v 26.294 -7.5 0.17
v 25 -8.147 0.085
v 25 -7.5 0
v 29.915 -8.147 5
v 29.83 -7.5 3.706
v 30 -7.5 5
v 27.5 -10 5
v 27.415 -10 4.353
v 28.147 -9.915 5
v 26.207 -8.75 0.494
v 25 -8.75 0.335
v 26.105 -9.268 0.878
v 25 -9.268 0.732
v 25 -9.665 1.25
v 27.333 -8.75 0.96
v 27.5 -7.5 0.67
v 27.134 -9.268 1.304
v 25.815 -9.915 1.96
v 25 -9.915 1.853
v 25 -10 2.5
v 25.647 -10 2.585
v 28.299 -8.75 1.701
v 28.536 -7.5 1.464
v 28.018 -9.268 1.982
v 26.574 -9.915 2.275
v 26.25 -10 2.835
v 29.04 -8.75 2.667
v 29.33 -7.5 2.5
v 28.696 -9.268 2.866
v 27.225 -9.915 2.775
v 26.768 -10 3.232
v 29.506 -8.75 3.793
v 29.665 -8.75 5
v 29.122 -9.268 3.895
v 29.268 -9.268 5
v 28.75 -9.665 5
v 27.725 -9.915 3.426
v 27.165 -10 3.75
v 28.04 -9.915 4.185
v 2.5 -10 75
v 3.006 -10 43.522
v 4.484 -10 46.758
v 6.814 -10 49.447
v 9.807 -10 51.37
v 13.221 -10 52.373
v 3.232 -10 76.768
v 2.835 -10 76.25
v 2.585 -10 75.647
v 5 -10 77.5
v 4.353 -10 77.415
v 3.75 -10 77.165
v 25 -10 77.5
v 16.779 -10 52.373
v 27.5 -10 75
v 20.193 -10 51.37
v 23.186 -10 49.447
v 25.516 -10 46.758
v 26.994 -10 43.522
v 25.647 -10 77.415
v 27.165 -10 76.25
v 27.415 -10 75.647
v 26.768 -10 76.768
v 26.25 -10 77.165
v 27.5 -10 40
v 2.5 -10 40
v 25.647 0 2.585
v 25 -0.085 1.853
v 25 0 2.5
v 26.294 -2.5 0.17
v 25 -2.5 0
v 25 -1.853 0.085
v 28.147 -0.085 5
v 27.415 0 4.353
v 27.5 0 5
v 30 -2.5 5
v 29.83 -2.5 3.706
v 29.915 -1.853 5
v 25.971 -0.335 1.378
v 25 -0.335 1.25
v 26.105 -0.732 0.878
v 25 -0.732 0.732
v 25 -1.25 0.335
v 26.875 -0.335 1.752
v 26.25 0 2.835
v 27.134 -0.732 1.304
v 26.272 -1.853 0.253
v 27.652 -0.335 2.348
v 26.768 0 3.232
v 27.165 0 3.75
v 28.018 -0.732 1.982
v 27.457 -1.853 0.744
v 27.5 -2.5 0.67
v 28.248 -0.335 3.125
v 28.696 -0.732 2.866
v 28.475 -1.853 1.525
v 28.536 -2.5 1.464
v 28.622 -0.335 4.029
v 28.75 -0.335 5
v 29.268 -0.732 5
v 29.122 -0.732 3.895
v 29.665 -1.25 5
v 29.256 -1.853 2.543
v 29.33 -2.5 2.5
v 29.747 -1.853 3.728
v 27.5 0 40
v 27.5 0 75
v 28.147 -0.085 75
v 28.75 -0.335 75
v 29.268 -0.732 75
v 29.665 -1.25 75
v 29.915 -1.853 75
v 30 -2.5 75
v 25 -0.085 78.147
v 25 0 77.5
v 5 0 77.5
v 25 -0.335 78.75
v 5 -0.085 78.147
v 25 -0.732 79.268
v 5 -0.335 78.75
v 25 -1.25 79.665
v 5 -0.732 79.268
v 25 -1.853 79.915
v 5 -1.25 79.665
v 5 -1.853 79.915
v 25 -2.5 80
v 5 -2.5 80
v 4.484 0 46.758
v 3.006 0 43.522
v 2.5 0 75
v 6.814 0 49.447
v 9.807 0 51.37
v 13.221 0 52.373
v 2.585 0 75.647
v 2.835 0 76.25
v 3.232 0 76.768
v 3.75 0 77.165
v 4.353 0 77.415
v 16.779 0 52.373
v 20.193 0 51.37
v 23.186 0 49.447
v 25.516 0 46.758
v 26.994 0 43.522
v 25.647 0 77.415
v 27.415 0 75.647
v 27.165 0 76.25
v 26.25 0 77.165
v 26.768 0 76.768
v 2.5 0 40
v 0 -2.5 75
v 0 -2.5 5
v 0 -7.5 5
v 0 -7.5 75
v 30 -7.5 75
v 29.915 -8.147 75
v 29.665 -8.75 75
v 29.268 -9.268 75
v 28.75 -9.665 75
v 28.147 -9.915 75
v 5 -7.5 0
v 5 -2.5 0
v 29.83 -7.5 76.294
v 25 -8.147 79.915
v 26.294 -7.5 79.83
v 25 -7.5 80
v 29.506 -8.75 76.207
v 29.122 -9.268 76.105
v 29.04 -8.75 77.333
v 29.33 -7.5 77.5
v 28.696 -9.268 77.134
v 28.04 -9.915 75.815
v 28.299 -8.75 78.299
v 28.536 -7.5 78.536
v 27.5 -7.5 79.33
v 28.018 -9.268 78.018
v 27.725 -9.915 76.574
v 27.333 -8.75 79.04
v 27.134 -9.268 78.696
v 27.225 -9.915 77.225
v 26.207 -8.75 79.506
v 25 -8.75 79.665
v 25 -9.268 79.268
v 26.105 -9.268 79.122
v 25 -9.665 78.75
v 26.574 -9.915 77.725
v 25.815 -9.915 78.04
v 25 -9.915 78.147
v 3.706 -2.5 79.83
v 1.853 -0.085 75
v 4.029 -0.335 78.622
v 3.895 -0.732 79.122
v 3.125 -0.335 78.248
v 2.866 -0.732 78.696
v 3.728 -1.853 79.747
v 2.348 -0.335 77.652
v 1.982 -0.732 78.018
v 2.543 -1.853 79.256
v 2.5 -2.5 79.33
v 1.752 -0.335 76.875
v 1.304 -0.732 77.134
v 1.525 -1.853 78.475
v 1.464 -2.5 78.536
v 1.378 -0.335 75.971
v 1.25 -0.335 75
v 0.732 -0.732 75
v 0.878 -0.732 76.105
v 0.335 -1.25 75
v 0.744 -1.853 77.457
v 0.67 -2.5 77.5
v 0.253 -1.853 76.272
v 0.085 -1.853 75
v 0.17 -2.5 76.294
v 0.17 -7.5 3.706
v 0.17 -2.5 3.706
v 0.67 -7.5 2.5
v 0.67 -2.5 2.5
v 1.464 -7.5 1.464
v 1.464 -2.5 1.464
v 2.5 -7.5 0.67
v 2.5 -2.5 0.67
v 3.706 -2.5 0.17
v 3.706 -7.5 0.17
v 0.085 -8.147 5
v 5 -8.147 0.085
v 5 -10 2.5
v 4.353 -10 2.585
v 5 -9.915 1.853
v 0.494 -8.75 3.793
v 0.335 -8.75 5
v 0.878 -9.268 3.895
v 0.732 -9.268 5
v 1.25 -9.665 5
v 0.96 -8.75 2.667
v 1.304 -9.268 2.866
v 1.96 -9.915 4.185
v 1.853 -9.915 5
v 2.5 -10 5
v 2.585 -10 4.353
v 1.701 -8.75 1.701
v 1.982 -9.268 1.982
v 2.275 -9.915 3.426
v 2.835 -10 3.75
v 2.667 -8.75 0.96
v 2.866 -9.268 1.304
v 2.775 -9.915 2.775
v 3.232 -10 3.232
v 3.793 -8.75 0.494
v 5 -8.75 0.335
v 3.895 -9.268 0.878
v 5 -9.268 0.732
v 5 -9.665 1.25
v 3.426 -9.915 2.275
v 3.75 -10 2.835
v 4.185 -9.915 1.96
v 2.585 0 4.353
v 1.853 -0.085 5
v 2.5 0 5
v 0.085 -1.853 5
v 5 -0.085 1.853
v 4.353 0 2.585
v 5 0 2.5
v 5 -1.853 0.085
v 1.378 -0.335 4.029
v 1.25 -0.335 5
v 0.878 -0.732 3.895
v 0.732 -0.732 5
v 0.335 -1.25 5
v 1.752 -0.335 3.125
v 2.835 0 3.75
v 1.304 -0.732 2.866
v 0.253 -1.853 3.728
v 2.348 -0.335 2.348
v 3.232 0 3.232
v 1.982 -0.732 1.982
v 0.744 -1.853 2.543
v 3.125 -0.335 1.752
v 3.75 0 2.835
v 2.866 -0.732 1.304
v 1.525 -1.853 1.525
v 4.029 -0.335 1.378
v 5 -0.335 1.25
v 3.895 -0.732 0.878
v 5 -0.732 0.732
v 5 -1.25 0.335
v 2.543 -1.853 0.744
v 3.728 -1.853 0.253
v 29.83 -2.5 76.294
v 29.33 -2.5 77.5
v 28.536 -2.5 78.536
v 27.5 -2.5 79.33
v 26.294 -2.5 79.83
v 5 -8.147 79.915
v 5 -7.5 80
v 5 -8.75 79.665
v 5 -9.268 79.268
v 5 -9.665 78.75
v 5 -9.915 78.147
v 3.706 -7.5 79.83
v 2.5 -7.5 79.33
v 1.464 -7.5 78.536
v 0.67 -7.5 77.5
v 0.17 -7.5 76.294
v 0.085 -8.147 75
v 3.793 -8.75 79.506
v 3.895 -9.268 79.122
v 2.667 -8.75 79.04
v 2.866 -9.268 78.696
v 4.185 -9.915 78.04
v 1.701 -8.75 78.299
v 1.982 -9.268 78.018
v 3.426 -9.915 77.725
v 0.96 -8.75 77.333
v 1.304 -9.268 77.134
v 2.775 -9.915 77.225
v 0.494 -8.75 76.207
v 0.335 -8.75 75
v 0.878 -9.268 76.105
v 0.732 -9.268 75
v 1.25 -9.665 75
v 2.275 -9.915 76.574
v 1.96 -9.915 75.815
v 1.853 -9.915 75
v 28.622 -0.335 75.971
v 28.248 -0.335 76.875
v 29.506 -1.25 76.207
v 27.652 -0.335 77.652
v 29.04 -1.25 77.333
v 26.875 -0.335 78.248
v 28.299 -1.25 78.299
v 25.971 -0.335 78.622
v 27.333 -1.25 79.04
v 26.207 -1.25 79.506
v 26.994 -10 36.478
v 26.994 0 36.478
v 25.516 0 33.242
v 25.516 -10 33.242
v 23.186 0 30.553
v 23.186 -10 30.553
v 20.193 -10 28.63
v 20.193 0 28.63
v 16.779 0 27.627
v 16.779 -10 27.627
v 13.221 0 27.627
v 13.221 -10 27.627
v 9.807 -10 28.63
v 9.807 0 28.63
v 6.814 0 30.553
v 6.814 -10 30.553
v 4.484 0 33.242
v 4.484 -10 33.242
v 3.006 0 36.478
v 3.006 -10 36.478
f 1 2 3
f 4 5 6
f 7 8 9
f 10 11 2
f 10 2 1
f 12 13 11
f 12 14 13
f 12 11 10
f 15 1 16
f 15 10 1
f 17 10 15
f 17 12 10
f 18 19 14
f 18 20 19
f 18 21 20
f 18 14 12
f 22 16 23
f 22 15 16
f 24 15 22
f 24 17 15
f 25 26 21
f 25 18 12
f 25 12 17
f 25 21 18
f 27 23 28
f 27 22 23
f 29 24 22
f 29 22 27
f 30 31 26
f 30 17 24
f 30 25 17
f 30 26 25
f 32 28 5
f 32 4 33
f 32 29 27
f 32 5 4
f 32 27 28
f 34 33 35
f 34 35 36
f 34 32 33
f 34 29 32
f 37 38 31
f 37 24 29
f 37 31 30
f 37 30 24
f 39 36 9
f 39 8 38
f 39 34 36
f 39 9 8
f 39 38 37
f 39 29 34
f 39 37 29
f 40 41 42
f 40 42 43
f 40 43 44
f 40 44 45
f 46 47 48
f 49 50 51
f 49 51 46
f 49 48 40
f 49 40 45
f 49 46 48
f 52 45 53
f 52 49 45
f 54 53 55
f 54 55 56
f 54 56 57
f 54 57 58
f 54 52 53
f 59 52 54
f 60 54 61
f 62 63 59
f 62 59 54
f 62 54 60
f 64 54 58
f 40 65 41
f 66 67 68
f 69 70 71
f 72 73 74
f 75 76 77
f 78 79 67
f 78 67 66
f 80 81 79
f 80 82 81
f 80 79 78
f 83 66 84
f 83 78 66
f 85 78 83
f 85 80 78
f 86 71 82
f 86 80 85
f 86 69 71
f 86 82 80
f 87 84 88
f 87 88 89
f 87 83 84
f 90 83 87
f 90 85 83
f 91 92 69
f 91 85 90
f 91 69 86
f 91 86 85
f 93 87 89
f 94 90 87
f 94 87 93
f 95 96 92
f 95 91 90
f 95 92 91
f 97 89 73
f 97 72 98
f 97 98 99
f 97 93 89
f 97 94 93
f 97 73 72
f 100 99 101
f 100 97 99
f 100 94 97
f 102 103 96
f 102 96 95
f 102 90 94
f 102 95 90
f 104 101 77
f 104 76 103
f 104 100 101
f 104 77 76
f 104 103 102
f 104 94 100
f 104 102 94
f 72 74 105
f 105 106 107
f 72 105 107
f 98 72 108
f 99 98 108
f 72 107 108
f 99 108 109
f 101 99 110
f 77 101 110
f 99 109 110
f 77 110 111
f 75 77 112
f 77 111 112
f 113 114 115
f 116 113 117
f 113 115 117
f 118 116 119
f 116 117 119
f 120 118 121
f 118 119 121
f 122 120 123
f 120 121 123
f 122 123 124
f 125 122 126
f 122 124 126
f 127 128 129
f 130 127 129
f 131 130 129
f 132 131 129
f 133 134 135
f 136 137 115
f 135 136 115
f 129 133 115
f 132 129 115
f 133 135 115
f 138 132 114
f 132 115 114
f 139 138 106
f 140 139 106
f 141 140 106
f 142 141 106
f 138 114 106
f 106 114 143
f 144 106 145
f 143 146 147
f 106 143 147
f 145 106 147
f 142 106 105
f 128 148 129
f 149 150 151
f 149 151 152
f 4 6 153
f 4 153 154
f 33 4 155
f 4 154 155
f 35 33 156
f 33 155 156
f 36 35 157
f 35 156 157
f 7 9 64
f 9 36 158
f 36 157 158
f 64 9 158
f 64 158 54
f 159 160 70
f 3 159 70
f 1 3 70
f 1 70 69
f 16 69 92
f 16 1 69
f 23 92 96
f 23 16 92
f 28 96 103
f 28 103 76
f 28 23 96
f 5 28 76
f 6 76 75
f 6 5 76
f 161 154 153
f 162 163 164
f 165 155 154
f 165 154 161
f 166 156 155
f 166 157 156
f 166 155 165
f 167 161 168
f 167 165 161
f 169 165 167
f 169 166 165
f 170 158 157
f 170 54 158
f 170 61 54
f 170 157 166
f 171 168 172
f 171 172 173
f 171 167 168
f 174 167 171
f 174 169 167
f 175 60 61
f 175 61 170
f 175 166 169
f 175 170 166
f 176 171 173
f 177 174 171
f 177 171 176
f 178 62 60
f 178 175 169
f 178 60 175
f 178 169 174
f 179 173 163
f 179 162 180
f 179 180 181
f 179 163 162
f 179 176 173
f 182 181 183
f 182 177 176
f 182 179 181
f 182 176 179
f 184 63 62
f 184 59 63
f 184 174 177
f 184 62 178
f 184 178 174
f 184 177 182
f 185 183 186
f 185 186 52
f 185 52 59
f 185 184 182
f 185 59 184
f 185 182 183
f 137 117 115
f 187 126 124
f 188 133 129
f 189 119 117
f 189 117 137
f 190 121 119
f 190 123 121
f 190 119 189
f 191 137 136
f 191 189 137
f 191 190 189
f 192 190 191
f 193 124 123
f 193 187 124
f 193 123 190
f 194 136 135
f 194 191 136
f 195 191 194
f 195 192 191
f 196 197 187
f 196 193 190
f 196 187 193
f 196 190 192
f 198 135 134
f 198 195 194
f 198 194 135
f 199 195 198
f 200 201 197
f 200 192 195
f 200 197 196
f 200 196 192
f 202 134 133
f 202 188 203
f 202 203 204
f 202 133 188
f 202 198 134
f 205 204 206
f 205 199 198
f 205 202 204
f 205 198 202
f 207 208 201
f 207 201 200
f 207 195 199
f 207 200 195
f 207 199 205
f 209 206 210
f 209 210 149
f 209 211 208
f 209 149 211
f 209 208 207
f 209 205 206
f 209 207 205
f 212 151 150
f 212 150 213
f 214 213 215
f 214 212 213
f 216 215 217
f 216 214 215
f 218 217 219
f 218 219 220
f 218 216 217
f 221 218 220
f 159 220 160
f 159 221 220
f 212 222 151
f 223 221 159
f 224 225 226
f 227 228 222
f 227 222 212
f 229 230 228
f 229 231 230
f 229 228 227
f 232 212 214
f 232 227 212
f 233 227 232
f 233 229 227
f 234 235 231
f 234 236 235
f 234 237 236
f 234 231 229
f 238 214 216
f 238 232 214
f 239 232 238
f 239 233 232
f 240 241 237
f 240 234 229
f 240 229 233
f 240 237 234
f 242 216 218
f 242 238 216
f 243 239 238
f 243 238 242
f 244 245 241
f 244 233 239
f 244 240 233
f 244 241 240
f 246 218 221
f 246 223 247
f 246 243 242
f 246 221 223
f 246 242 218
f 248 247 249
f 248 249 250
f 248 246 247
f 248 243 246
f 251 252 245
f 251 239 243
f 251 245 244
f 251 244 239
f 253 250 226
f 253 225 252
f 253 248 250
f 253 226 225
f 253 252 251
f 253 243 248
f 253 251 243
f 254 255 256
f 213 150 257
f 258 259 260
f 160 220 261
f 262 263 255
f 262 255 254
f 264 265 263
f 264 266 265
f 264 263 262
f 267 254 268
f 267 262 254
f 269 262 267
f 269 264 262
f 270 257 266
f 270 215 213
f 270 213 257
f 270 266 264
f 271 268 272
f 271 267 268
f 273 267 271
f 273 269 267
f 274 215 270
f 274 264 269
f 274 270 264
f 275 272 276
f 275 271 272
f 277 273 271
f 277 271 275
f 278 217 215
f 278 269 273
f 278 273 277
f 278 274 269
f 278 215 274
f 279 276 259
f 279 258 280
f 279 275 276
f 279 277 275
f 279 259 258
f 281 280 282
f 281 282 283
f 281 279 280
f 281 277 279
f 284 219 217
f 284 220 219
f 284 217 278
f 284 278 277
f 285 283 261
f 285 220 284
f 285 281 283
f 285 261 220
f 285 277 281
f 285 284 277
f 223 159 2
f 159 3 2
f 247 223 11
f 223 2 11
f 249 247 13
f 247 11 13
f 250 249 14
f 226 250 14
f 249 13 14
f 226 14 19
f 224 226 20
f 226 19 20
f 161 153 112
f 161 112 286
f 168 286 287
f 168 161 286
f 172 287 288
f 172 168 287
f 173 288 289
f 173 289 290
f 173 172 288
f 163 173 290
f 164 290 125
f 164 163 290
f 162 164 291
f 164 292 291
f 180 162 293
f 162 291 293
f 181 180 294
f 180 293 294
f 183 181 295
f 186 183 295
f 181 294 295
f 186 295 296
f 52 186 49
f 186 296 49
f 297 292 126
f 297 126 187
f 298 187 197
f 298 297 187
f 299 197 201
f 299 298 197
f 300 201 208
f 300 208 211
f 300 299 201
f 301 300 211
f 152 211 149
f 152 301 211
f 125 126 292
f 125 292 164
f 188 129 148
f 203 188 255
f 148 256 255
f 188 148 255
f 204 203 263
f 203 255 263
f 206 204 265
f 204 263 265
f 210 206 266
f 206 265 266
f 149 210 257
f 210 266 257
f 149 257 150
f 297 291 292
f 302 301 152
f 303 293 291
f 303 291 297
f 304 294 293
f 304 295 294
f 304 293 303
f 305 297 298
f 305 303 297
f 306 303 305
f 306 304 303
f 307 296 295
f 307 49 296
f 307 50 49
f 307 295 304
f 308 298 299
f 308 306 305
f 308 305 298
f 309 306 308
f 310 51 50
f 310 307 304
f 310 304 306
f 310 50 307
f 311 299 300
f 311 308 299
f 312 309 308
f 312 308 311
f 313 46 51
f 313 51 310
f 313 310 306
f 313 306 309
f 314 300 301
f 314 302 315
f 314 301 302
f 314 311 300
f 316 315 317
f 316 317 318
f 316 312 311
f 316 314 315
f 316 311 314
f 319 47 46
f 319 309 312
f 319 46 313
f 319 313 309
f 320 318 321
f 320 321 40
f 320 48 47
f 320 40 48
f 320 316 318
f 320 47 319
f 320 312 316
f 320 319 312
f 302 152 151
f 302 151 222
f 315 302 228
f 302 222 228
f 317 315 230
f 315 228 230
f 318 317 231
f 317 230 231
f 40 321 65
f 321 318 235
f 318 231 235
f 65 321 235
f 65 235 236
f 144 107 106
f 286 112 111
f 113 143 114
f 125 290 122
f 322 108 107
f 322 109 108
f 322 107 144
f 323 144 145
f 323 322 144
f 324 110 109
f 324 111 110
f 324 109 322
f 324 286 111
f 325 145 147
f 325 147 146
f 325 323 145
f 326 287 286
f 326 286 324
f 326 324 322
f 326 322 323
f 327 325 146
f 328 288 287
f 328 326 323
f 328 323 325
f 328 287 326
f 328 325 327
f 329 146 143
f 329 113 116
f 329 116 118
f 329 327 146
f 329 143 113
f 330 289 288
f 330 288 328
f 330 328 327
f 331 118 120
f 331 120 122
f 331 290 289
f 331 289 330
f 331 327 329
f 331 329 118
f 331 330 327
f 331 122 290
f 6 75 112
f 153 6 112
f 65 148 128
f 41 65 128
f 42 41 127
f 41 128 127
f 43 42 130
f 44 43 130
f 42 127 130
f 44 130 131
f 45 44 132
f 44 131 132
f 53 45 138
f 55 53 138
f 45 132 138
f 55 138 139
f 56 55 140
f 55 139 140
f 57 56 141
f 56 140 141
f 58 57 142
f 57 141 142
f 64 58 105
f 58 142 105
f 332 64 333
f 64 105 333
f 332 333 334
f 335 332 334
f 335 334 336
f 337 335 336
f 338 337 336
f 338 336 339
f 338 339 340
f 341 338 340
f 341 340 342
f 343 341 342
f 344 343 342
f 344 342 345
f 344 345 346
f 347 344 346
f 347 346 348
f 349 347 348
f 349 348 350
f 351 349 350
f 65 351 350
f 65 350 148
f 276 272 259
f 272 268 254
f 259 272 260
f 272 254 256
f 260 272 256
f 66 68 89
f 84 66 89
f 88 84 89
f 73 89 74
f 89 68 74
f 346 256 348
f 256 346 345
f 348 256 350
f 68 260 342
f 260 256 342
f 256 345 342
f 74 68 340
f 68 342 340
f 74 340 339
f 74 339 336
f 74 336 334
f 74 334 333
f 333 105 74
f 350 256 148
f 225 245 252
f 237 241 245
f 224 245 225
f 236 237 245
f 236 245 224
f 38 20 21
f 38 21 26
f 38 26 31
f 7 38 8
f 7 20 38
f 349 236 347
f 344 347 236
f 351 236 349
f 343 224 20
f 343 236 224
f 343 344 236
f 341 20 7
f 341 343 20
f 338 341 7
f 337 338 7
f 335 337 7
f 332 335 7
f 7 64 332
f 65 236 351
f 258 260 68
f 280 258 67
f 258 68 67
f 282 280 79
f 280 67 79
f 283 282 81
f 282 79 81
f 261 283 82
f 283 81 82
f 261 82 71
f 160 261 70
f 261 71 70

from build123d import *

# Parameters (mm, degrees)
F0_W     = 30
F0_H     = 80
F1_DEPTH = 10
F2_R     = 5
F3_R     = 5
F4_R     = 5
F5_R     = 5
F6_R     = 2.5
F7_R     = 2.5
F9_D     = 25


with BuildPart() as f1:
    # F0 (on Front) → F1 (new body)
    with BuildSketch(Plane.XZ):
        with Locations((15, 40)):
            Rectangle(F0_W, F0_H)
    extrude(amount=F1_DEPTH)

    # F2
    f2_edges = [f1.edges().sort_by_distance(p)[0] for p in [
        (30, -5, 80),
    ]]
    fillet(f2_edges, radius=F2_R)

    # F3
    f3_edges = [f1.edges().sort_by_distance(p)[0] for p in [
        (0, -5, 80),
    ]]
    fillet(f3_edges, radius=F3_R)

    # F4
    f4_edges = [f1.edges().sort_by_distance(p)[0] for p in [
        (0, -5, 0),
    ]]
    fillet(f4_edges, radius=F4_R)

    # F5
    f5_edges = [f1.edges().sort_by_distance(p)[0] for p in [
        (30, -5, 0),
    ]]
    fillet(f5_edges, radius=F5_R)

    # F6
    f6_edges = [f1.edges().sort_by_distance(p)[0] for p in [
        (28.535534, -10, 78.535534),
    ]]
    fillet(f6_edges, radius=F6_R)

    # F7
    f7_edges = [f1.edges().sort_by_distance(p)[0] for p in [
        (28.535534, 0, 78.535534),
    ]]
    fillet(f7_edges, radius=F7_R)

    # F9 (through all)
    with Locations(Plane.XZ.offset(10)):
        with Locations((15, 40)):
            Hole(F9_D / 2)


solid = f1.part
